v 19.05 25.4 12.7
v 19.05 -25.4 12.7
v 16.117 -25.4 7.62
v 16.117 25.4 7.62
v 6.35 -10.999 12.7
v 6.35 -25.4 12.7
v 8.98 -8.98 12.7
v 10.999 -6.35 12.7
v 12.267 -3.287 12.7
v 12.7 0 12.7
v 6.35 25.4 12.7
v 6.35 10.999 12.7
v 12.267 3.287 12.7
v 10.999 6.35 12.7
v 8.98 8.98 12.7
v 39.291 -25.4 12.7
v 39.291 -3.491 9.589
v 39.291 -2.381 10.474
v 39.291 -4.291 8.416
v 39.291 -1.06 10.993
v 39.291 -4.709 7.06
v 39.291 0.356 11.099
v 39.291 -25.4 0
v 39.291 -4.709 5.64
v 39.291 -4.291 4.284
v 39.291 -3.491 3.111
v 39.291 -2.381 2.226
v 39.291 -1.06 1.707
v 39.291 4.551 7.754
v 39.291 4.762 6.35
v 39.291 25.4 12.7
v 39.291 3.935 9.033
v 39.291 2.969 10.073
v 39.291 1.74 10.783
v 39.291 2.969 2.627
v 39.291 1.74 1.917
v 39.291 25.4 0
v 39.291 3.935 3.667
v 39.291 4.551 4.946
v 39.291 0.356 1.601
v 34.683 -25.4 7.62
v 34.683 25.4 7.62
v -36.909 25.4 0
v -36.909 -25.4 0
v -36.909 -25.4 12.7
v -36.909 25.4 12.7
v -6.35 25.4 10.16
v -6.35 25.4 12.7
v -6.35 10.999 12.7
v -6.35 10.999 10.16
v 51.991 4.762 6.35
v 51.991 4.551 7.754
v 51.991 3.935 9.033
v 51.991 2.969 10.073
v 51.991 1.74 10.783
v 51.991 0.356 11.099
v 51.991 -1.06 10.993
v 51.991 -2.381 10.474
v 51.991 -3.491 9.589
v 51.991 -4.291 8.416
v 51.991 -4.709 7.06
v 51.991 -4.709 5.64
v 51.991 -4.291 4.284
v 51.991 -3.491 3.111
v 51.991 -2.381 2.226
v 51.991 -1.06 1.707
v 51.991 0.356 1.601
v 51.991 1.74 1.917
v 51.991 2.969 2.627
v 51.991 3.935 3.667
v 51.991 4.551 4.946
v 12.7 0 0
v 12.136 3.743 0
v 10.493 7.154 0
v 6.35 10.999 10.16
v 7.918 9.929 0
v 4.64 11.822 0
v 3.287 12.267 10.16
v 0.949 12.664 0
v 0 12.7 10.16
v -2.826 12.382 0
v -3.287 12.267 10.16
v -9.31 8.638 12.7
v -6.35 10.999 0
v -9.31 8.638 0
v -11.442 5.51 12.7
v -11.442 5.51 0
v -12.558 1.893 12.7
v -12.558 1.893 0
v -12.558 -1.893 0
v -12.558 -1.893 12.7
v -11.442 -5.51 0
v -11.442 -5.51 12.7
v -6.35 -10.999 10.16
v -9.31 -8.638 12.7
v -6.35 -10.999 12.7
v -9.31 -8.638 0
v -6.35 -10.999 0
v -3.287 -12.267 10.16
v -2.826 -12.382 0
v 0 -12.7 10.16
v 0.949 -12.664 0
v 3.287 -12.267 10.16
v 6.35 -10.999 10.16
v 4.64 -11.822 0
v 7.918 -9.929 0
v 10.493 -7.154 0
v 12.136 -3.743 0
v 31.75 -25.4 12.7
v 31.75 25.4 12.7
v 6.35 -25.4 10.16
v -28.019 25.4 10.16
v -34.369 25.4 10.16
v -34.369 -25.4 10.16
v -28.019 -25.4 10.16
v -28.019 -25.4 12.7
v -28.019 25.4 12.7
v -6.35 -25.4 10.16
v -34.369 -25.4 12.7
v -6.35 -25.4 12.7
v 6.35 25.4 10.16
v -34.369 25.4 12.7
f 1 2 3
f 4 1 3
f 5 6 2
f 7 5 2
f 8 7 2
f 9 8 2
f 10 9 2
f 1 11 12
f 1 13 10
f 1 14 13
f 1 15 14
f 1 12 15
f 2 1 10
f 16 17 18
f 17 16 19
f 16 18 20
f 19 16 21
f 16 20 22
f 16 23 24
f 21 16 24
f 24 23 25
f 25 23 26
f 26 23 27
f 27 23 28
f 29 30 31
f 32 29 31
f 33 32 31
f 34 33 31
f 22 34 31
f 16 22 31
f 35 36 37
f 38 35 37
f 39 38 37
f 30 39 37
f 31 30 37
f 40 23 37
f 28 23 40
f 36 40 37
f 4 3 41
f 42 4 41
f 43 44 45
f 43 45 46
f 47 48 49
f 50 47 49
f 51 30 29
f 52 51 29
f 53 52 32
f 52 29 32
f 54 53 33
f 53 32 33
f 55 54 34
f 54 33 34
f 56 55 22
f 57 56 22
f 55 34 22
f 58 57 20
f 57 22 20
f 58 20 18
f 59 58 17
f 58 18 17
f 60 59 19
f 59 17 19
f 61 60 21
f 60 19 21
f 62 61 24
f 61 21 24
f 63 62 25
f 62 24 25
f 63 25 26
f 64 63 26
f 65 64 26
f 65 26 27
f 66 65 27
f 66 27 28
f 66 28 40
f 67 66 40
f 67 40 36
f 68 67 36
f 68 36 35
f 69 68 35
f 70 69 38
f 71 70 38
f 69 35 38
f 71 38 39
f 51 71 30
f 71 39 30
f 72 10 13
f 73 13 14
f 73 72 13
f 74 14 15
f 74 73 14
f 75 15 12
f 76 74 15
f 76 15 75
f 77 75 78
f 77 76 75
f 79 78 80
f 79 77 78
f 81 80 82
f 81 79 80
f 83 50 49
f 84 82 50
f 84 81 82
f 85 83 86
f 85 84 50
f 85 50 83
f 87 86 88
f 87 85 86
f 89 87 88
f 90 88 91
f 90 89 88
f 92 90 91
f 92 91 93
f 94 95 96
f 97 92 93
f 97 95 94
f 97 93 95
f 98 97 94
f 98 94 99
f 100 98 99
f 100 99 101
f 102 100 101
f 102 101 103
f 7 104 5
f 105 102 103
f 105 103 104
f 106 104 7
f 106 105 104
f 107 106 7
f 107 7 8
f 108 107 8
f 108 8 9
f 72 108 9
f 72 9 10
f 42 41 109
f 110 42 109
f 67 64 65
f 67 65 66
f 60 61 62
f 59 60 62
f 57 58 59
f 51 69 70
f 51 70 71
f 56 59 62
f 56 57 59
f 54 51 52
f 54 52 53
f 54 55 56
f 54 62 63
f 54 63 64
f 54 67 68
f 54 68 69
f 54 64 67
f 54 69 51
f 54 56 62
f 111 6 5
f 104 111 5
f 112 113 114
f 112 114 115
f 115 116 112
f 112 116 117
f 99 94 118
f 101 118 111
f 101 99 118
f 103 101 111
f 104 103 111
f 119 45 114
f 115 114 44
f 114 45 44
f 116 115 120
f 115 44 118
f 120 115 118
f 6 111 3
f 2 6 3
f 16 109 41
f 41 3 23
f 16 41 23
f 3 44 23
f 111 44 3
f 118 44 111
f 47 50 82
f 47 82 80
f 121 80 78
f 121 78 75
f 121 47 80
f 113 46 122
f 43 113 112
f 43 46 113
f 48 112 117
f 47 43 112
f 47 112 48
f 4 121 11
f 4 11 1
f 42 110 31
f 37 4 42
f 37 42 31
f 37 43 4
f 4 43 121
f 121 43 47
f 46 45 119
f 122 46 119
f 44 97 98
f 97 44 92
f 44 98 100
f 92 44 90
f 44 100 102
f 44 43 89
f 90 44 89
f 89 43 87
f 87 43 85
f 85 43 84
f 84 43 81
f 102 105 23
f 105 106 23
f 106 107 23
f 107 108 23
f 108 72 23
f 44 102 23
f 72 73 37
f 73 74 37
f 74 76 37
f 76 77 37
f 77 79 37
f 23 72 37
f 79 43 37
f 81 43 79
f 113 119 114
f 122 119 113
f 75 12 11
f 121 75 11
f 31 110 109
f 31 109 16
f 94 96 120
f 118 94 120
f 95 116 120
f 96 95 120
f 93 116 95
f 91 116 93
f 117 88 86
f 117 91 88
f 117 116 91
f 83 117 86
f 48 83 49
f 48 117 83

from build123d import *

# Parameters (mm, degrees)
F0_W     = 76.2
F0_H     = 50.8
F0_R     = 12.7
F1_DEPTH = 12.7
F2_W     = 6.35
F2_H     = 50.8
F3_DEPTH = 2.54
F5_DEPTH = 50.8
F6_R     = 4.7625
F7_DEPTH = 12.7


with BuildPart() as f1:
    # F0 (on Top) → F1 (new body)
    with BuildSketch(Plane.XY):
        with Locations((1.190625, 0)):
            Rectangle(F0_W, F0_H)
        Circle(F0_R, mode=Mode.SUBTRACT)
    extrude(amount=F1_DEPTH)

    # F2 (on face) → F3 (cut)
    with BuildSketch(Plane.XY.offset(12.7)):
        with Locations((-31.194375, 0)):
            Rectangle(F2_W, F2_H)
        with BuildLine():
            Line((-6.35, -10.9985226281), (-6.35, -25.4))
            Line((-6.35, -25.4), (6.35, -25.4))
            Line((6.35, -25.4), (6.35, -10.9985226281))
            ThreePointArc((6.35, -10.9985226281), (0, -12.7), (-6.35, -10.9985226281))
        make_face()
        with BuildLine():
            Line((6.35, 25.4), (-6.35, 25.4))
            Line((-6.35, 25.4), (-6.35, 10.9985226281))
            ThreePointArc((-6.35, 10.9985226281), (0, 12.7), (6.35, 10.9985226281))
            Line((6.35, 10.9985226281), (6.35, 25.4))
        make_face()
    extrude(amount=-F3_DEPTH, mode=Mode.SUBTRACT)

    # F4 (on face) → F5 (cut)
    with BuildSketch(Plane.XZ.offset(25.4)):
        Polygon((31.75, 12.7), (19.05, 12.7), (16.1170606325, 7.62), (34.6829393675, 7.62), align=None)
    extrude(amount=-F5_DEPTH, mode=Mode.SUBTRACT)

    # F6 (on face) → F7 (join)
    with BuildSketch(Plane.YZ.offset(39.290625)):
        with Locations((0, 6.35)):
            Circle(F6_R)
    extrude(amount=F7_DEPTH)


solid = f1.part
